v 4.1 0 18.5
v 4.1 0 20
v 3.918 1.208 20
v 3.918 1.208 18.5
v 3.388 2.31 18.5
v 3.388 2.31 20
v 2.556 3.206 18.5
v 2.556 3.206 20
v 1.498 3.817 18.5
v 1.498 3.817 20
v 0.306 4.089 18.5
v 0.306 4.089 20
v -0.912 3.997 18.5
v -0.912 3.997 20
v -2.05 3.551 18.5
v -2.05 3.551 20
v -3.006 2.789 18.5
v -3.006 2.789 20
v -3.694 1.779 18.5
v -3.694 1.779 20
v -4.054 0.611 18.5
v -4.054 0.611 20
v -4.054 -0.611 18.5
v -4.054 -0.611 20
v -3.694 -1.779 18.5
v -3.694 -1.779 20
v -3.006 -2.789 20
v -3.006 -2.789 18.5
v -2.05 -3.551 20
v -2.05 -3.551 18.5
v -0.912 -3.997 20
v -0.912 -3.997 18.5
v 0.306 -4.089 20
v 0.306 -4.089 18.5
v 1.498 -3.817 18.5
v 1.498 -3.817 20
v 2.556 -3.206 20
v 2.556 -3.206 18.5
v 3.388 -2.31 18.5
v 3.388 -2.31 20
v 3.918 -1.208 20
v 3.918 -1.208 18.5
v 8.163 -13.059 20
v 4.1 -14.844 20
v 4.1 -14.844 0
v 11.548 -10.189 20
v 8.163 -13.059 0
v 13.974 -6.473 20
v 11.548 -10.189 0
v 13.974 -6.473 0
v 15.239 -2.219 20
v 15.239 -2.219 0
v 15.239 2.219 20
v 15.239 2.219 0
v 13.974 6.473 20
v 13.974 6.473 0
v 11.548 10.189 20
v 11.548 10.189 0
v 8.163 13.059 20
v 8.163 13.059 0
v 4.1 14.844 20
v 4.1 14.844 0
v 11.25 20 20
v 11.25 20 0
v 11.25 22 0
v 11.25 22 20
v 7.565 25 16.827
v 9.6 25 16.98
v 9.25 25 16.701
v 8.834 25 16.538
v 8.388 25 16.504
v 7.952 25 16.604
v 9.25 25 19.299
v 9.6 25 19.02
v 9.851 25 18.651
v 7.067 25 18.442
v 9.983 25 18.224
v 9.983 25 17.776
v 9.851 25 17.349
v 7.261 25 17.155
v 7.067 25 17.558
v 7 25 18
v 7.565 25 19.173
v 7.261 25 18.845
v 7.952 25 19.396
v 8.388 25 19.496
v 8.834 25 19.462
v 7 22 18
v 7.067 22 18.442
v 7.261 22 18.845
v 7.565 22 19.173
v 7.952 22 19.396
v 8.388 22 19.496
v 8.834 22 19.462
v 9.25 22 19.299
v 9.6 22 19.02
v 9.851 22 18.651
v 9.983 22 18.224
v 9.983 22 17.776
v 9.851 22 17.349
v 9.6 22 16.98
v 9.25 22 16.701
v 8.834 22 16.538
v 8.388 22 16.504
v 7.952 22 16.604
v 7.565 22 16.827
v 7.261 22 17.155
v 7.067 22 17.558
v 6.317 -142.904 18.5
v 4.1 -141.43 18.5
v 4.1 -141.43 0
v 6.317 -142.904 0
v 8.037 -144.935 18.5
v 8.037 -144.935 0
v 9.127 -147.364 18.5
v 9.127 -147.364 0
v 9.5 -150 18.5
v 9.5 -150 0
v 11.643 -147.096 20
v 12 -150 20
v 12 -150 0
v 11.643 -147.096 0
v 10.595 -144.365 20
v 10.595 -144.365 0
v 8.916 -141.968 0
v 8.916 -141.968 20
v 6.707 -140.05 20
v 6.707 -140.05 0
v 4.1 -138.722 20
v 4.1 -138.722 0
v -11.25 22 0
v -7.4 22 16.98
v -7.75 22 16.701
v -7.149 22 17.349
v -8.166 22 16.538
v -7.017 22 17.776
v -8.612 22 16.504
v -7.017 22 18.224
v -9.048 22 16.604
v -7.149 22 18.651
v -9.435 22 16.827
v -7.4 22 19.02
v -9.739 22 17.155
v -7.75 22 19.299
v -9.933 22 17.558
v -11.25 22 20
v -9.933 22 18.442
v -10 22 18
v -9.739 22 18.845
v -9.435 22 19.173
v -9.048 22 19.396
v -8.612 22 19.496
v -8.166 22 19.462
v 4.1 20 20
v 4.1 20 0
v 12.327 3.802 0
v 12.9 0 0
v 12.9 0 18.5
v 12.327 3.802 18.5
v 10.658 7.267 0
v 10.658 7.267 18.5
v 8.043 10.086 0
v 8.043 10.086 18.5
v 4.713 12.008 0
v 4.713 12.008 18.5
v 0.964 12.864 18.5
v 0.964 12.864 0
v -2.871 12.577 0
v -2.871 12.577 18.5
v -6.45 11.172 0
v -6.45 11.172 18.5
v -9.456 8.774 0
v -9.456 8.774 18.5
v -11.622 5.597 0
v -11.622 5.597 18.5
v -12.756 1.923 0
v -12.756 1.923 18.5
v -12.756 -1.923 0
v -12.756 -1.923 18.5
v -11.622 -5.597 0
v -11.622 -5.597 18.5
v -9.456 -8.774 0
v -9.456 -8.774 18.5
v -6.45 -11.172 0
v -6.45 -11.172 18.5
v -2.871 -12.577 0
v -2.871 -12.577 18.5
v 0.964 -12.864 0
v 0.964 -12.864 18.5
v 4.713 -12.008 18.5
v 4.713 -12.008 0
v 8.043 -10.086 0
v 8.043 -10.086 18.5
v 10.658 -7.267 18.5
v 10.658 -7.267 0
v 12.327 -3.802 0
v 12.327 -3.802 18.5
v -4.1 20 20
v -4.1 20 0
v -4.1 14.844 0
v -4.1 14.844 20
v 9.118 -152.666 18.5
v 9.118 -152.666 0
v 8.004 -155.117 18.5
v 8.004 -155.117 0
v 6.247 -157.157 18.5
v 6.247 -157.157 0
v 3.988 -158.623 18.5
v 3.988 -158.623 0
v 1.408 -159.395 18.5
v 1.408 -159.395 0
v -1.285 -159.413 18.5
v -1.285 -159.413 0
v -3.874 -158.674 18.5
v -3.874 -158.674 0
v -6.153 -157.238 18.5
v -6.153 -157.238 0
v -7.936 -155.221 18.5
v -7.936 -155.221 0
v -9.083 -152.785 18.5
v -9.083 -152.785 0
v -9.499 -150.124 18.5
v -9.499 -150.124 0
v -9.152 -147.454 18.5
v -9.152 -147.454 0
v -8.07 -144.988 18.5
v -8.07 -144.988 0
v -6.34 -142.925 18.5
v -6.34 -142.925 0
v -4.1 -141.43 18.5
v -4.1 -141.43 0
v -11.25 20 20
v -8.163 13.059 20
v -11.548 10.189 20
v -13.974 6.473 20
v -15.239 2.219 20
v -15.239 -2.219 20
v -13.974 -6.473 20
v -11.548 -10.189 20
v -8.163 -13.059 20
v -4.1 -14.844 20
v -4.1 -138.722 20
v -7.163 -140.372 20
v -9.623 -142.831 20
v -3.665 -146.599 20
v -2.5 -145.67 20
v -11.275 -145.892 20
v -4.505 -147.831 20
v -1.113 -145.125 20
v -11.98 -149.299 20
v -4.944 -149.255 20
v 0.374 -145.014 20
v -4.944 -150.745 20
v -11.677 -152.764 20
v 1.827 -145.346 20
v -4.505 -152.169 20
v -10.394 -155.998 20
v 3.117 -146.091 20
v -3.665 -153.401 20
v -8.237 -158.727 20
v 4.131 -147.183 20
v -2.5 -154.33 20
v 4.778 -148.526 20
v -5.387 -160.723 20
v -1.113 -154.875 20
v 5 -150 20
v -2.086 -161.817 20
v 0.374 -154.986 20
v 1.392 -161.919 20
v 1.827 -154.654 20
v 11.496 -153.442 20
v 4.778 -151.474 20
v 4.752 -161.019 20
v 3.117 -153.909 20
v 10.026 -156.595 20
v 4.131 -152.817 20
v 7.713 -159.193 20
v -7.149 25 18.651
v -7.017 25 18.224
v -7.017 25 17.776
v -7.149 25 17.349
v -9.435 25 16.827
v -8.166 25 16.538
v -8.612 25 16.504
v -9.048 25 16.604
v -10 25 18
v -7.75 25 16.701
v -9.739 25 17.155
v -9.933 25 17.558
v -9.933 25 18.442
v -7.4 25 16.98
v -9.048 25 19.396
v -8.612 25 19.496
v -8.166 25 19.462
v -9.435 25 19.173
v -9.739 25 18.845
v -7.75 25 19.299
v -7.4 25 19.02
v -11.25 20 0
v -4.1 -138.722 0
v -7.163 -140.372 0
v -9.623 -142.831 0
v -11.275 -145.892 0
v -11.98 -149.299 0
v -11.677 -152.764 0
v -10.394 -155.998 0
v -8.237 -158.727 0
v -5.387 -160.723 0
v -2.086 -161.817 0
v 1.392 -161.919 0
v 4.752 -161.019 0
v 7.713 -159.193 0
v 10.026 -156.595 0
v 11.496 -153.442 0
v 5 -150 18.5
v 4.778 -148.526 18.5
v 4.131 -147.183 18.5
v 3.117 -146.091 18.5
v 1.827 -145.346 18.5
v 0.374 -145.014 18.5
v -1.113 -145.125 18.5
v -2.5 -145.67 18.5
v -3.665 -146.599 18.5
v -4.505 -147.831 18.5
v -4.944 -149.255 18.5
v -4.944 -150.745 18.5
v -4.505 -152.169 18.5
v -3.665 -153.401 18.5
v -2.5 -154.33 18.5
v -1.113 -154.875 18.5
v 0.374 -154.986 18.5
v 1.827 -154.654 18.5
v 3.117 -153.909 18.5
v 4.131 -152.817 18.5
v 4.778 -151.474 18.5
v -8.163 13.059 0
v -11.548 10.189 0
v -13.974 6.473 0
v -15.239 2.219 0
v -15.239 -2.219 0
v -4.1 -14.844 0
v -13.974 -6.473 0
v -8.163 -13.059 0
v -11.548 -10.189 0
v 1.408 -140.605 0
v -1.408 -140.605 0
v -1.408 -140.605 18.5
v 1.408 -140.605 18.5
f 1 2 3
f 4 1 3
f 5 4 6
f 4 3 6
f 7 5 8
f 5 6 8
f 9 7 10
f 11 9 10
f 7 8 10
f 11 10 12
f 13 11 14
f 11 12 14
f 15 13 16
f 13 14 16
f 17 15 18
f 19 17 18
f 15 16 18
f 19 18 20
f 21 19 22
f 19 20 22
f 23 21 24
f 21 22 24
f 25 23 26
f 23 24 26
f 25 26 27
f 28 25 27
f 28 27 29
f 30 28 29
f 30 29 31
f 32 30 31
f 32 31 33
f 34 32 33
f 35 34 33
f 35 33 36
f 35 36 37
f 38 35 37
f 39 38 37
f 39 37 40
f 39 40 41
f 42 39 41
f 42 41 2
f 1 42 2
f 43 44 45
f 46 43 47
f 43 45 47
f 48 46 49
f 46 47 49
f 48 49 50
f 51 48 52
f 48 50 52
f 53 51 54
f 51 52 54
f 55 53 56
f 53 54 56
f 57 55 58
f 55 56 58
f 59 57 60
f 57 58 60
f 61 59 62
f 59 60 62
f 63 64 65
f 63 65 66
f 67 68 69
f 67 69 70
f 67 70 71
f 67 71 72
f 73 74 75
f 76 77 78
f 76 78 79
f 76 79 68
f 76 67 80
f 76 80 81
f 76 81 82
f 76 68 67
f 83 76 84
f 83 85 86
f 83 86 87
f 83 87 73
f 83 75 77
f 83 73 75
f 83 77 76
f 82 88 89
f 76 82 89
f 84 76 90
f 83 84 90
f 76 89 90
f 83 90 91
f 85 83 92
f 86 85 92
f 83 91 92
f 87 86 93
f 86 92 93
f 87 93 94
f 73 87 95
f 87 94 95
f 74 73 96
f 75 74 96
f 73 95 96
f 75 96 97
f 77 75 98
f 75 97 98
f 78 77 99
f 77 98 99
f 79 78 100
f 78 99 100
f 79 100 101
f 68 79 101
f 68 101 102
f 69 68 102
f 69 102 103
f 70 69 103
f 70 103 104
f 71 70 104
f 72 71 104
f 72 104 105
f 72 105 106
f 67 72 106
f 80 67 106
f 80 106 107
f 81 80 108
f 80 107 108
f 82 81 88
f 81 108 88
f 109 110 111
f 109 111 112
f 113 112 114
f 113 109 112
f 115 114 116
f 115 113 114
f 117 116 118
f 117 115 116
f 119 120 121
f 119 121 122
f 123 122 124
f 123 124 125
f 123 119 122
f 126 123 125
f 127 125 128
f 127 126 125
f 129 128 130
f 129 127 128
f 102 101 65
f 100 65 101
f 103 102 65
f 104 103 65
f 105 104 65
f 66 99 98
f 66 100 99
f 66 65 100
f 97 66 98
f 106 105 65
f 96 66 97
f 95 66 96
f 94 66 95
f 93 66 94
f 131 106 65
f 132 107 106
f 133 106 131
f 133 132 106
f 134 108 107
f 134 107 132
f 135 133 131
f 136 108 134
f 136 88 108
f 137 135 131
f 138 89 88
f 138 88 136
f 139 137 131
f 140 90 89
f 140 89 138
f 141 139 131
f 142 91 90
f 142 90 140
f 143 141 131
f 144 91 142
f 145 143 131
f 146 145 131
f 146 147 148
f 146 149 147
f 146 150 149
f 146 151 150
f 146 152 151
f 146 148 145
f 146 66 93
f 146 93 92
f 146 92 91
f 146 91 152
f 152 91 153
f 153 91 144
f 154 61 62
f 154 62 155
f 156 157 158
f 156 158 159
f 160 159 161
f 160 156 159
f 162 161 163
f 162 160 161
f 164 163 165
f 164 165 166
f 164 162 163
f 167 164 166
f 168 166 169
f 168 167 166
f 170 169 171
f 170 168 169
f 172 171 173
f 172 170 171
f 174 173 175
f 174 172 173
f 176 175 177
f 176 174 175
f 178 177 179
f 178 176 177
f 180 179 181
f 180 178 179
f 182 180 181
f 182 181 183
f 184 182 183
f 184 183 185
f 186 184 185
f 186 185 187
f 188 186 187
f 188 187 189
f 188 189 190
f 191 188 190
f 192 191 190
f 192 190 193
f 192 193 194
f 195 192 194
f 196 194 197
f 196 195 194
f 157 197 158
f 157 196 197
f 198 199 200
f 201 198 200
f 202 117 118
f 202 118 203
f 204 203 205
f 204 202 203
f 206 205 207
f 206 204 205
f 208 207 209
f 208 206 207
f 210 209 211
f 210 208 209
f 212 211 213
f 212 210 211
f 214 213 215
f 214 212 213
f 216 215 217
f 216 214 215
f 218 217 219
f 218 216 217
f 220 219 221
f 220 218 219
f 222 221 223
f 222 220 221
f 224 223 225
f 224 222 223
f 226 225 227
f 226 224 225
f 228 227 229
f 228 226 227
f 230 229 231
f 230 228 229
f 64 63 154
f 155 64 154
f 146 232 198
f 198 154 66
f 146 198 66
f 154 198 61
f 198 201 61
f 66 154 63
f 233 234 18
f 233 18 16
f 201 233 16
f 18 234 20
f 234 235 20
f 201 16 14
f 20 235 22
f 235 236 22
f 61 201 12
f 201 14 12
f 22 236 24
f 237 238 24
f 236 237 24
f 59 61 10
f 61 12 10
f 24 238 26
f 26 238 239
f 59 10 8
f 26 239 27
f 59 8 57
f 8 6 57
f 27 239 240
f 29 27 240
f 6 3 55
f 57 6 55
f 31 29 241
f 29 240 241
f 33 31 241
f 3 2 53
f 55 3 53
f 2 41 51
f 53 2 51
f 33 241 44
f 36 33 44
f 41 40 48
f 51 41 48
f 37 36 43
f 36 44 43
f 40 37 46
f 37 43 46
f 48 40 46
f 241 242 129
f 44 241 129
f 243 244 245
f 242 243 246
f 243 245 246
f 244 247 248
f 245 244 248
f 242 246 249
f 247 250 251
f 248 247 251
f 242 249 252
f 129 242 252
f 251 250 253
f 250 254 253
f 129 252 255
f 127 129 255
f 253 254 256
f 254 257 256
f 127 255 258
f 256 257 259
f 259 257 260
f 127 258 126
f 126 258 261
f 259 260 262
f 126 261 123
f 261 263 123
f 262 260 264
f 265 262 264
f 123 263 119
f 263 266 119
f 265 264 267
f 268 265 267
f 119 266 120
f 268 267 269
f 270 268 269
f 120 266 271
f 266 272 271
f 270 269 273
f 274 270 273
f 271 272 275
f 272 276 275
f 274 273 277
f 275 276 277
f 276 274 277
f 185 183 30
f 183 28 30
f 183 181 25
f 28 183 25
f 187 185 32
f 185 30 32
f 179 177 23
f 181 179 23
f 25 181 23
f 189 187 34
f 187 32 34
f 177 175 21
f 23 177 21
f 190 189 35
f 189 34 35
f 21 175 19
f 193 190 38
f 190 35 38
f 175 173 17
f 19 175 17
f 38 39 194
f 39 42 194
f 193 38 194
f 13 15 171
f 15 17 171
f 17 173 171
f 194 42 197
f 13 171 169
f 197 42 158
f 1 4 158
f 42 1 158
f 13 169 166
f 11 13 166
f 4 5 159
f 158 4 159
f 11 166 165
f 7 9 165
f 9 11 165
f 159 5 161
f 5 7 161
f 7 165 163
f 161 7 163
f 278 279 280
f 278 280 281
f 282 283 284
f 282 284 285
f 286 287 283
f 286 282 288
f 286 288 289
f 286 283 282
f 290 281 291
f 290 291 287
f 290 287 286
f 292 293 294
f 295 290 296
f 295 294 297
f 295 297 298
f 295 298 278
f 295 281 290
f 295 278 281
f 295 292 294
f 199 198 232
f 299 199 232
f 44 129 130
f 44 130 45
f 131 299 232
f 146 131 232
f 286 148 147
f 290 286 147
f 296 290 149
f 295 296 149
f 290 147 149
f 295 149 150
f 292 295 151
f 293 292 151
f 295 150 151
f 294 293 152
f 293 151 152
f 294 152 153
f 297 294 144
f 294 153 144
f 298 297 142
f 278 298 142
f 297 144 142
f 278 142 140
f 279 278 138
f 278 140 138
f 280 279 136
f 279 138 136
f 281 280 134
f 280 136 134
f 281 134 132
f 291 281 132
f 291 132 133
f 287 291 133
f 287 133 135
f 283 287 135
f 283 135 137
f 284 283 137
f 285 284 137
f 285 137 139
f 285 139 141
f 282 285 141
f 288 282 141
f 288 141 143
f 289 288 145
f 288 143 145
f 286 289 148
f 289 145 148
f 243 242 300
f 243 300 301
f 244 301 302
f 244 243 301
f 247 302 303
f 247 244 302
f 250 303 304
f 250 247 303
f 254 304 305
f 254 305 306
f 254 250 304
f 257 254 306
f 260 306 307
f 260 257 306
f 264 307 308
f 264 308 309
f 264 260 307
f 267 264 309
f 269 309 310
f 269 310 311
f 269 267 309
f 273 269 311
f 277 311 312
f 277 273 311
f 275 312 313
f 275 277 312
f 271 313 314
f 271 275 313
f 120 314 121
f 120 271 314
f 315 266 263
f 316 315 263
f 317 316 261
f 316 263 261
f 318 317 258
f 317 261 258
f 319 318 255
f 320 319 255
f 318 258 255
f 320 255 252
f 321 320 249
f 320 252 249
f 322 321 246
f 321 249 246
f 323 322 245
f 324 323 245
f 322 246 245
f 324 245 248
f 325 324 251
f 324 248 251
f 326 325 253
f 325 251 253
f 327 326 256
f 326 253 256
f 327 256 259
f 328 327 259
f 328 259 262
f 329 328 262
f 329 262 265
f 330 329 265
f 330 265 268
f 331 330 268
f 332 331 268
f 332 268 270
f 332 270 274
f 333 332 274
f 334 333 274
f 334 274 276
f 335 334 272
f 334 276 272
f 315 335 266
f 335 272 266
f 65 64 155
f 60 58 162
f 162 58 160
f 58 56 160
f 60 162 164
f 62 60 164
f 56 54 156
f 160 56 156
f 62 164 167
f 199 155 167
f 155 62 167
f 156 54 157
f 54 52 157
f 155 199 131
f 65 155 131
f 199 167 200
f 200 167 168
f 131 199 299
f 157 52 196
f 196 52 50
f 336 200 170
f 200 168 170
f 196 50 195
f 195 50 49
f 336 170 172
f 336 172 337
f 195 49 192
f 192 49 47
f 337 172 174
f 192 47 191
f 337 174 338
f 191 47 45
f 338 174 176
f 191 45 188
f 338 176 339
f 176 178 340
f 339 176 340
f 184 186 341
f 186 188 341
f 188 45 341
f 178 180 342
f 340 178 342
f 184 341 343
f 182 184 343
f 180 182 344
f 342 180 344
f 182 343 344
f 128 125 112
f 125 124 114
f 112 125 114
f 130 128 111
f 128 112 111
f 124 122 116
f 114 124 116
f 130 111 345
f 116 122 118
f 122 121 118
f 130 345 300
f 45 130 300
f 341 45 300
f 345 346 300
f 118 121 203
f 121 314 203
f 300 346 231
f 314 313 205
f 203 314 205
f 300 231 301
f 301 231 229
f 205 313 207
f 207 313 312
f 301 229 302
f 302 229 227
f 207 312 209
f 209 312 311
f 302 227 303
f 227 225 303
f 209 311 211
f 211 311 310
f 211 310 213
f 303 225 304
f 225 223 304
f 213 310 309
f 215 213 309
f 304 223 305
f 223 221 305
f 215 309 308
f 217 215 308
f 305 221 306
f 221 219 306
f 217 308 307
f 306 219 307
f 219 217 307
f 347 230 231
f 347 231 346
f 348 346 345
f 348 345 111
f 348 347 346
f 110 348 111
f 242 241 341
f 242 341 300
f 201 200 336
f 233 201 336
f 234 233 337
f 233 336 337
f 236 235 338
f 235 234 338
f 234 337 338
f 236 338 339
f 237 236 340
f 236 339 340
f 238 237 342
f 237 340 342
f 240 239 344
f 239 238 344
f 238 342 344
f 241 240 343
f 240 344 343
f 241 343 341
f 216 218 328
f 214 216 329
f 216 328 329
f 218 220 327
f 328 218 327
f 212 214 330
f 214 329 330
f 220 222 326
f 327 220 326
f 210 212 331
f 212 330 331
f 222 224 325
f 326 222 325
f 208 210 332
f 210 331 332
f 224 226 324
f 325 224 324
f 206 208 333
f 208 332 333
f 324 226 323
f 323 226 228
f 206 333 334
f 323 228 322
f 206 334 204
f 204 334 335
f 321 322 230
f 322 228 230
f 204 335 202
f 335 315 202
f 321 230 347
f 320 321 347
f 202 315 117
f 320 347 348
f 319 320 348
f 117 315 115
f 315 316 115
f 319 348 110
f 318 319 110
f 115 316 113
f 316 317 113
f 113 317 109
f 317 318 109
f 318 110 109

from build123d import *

# Parameters (mm, degrees)
F0_R      = 15.4
F0_R_2    = 12.9
F1_DEPTH  = 20
F2_DEPTH  = 18.5
F3_R      = 4.1
F4_DEPTH  = 25
F6_DEPTH  = 20
F7_R      = 9.5
F7_R_2    = 5
F8_DEPTH  = 1.5
F9_DEPTH  = 20
F10_W     = 8.4
F10_H     = 20
F10_W_2   = 8.2
F11_DEPTH = 2
F12_R     = 1.5
F13_DEPTH = 3
F14_DEPTH = 1.25
F15_DEPTH = 1.25


with BuildPart() as f1:
    # F0 (on Top) → F1 (new body)
    with BuildSketch(Plane.XY):
        Circle(F0_R)
        Circle(F0_R_2, mode=Mode.SUBTRACT)
        Circle(F0_R_2)
    extrude(amount=F1_DEPTH)

    # F0 (on Top) → F2 (cut)
    with BuildSketch(Plane.XY):
        Circle(F0_R_2)
    extrude(amount=F2_DEPTH, mode=Mode.SUBTRACT)

    # F3 (on face) → F4 (cut)
    with BuildSketch(Plane.XY.offset(20)):
        Circle(F3_R)
    extrude(amount=-F4_DEPTH, mode=Mode.SUBTRACT)

    # F5 (on face) → F6 (join, through all)
    with BuildSketch(Plane.XY.offset(20)):
        with BuildLine():
            ThreePointArc((4.1, -14.8441907829), (0, -15.4), (-4.1, -14.8441907829))
            Line((-4.1, -14.8441907829), (-4.1, -138.7221455941))
            ThreePointArc((-4.1, -138.7221455941), (0, -138), (4.1, -138.7221455941))
            Line((4.1, -138.7221455941), (4.1, -14.8441907829))
        make_face()
        with BuildLine():
            ThreePointArc((4.1, -138.7221455941), (0, -138), (-4.1, -138.7221455941))
            Line((-4.1, -138.7221455941), (-4.1, -141.4302858857))
            ThreePointArc((-4.1, -141.4302858857), (0, -140.5), (4.1, -141.4302858857))
            Line((4.1, -141.4302858857), (4.1, -138.7221455941))
        make_face()
        with BuildLine():
            Line((-4.1, -141.4302858857), (-4.1, -138.7221455941))
            ThreePointArc((-4.1, -138.7221455941), (-6.8847657912, -159.8285299002), (12, -150))
            ThreePointArc((12, -150), (9.8285299002, -143.1152342088), (4.1, -138.7221455941))
            Line((4.1, -138.7221455941), (4.1, -141.4302858857))
            ThreePointArc((4.1, -141.4302858857), (8.037412519, -144.9354170952), (9.5, -150))
            ThreePointArc((9.5, -150), (-5.0645829048, -158.037412519), (-4.1, -141.4302858857))
        make_face()
    extrude(amount=-F6_DEPTH)

    # F7 (on face) → F8 (join, through all)
    with BuildSketch(Plane.XY.offset(20)):
        with Locations((0, -150)):
            Circle(F7_R)
        with Locations((0, -150)):
            Circle(F7_R_2, mode=Mode.SUBTRACT)
    extrude(amount=-F8_DEPTH)

    # F5 (on face) → F9 (join, through all)
    with BuildSketch(Plane.XY.offset(20)):
        with BuildLine():
            Line((-4.1, 20), (-4.1, 14.8441907829))
            ThreePointArc((-4.1, 14.8441907829), (0, 15.4), (4.1, 14.8441907829))
            Line((4.1, 14.8441907829), (4.1, 20))
            Line((4.1, 20), (-4.1, 20))
        make_face()
    extrude(amount=-F9_DEPTH)

    # F10 (on face) → F11 (join)
    with BuildSketch(Plane(origin=(0, 20, 0), x_dir=(-1, 0, 0), z_dir=(0, 1, 0))):
        with Locations((-8.3, 10)):
            Rectangle(F10_W, F10_H)
        with Locations((8.3, 10)):
            Rectangle(F10_W, F10_H)
        with Locations((0, 10)):
            Rectangle(F10_W_2, F10_H)
    extrude(amount=F11_DEPTH)

    # F12 (on face) → F13 (join)
    with BuildSketch(Plane(origin=(0, 22, 0), x_dir=(-1, 0, 0), z_dir=(0, 1, 0))):
        with Locations((-8.5, 18)):
            Circle(F12_R)
        with Locations((8.5, 18)):
            Circle(F12_R)
    extrude(amount=F13_DEPTH)

    # F14 (cut): a face of the model
    f14_faces = [f1.faces().sort_by_distance(p)[0] for p in [
        (12.5, 21, 10),
    ]]
    extrude(f14_faces, amount=-F14_DEPTH, mode=Mode.SUBTRACT)

    # F15 (cut): a face of the model
    f15_faces = [f1.faces().sort_by_distance(p)[0] for p in [
        (-12.5, 21, 10),
    ]]
    extrude(f15_faces, amount=-F15_DEPTH, mode=Mode.SUBTRACT)


solid = f1.part
